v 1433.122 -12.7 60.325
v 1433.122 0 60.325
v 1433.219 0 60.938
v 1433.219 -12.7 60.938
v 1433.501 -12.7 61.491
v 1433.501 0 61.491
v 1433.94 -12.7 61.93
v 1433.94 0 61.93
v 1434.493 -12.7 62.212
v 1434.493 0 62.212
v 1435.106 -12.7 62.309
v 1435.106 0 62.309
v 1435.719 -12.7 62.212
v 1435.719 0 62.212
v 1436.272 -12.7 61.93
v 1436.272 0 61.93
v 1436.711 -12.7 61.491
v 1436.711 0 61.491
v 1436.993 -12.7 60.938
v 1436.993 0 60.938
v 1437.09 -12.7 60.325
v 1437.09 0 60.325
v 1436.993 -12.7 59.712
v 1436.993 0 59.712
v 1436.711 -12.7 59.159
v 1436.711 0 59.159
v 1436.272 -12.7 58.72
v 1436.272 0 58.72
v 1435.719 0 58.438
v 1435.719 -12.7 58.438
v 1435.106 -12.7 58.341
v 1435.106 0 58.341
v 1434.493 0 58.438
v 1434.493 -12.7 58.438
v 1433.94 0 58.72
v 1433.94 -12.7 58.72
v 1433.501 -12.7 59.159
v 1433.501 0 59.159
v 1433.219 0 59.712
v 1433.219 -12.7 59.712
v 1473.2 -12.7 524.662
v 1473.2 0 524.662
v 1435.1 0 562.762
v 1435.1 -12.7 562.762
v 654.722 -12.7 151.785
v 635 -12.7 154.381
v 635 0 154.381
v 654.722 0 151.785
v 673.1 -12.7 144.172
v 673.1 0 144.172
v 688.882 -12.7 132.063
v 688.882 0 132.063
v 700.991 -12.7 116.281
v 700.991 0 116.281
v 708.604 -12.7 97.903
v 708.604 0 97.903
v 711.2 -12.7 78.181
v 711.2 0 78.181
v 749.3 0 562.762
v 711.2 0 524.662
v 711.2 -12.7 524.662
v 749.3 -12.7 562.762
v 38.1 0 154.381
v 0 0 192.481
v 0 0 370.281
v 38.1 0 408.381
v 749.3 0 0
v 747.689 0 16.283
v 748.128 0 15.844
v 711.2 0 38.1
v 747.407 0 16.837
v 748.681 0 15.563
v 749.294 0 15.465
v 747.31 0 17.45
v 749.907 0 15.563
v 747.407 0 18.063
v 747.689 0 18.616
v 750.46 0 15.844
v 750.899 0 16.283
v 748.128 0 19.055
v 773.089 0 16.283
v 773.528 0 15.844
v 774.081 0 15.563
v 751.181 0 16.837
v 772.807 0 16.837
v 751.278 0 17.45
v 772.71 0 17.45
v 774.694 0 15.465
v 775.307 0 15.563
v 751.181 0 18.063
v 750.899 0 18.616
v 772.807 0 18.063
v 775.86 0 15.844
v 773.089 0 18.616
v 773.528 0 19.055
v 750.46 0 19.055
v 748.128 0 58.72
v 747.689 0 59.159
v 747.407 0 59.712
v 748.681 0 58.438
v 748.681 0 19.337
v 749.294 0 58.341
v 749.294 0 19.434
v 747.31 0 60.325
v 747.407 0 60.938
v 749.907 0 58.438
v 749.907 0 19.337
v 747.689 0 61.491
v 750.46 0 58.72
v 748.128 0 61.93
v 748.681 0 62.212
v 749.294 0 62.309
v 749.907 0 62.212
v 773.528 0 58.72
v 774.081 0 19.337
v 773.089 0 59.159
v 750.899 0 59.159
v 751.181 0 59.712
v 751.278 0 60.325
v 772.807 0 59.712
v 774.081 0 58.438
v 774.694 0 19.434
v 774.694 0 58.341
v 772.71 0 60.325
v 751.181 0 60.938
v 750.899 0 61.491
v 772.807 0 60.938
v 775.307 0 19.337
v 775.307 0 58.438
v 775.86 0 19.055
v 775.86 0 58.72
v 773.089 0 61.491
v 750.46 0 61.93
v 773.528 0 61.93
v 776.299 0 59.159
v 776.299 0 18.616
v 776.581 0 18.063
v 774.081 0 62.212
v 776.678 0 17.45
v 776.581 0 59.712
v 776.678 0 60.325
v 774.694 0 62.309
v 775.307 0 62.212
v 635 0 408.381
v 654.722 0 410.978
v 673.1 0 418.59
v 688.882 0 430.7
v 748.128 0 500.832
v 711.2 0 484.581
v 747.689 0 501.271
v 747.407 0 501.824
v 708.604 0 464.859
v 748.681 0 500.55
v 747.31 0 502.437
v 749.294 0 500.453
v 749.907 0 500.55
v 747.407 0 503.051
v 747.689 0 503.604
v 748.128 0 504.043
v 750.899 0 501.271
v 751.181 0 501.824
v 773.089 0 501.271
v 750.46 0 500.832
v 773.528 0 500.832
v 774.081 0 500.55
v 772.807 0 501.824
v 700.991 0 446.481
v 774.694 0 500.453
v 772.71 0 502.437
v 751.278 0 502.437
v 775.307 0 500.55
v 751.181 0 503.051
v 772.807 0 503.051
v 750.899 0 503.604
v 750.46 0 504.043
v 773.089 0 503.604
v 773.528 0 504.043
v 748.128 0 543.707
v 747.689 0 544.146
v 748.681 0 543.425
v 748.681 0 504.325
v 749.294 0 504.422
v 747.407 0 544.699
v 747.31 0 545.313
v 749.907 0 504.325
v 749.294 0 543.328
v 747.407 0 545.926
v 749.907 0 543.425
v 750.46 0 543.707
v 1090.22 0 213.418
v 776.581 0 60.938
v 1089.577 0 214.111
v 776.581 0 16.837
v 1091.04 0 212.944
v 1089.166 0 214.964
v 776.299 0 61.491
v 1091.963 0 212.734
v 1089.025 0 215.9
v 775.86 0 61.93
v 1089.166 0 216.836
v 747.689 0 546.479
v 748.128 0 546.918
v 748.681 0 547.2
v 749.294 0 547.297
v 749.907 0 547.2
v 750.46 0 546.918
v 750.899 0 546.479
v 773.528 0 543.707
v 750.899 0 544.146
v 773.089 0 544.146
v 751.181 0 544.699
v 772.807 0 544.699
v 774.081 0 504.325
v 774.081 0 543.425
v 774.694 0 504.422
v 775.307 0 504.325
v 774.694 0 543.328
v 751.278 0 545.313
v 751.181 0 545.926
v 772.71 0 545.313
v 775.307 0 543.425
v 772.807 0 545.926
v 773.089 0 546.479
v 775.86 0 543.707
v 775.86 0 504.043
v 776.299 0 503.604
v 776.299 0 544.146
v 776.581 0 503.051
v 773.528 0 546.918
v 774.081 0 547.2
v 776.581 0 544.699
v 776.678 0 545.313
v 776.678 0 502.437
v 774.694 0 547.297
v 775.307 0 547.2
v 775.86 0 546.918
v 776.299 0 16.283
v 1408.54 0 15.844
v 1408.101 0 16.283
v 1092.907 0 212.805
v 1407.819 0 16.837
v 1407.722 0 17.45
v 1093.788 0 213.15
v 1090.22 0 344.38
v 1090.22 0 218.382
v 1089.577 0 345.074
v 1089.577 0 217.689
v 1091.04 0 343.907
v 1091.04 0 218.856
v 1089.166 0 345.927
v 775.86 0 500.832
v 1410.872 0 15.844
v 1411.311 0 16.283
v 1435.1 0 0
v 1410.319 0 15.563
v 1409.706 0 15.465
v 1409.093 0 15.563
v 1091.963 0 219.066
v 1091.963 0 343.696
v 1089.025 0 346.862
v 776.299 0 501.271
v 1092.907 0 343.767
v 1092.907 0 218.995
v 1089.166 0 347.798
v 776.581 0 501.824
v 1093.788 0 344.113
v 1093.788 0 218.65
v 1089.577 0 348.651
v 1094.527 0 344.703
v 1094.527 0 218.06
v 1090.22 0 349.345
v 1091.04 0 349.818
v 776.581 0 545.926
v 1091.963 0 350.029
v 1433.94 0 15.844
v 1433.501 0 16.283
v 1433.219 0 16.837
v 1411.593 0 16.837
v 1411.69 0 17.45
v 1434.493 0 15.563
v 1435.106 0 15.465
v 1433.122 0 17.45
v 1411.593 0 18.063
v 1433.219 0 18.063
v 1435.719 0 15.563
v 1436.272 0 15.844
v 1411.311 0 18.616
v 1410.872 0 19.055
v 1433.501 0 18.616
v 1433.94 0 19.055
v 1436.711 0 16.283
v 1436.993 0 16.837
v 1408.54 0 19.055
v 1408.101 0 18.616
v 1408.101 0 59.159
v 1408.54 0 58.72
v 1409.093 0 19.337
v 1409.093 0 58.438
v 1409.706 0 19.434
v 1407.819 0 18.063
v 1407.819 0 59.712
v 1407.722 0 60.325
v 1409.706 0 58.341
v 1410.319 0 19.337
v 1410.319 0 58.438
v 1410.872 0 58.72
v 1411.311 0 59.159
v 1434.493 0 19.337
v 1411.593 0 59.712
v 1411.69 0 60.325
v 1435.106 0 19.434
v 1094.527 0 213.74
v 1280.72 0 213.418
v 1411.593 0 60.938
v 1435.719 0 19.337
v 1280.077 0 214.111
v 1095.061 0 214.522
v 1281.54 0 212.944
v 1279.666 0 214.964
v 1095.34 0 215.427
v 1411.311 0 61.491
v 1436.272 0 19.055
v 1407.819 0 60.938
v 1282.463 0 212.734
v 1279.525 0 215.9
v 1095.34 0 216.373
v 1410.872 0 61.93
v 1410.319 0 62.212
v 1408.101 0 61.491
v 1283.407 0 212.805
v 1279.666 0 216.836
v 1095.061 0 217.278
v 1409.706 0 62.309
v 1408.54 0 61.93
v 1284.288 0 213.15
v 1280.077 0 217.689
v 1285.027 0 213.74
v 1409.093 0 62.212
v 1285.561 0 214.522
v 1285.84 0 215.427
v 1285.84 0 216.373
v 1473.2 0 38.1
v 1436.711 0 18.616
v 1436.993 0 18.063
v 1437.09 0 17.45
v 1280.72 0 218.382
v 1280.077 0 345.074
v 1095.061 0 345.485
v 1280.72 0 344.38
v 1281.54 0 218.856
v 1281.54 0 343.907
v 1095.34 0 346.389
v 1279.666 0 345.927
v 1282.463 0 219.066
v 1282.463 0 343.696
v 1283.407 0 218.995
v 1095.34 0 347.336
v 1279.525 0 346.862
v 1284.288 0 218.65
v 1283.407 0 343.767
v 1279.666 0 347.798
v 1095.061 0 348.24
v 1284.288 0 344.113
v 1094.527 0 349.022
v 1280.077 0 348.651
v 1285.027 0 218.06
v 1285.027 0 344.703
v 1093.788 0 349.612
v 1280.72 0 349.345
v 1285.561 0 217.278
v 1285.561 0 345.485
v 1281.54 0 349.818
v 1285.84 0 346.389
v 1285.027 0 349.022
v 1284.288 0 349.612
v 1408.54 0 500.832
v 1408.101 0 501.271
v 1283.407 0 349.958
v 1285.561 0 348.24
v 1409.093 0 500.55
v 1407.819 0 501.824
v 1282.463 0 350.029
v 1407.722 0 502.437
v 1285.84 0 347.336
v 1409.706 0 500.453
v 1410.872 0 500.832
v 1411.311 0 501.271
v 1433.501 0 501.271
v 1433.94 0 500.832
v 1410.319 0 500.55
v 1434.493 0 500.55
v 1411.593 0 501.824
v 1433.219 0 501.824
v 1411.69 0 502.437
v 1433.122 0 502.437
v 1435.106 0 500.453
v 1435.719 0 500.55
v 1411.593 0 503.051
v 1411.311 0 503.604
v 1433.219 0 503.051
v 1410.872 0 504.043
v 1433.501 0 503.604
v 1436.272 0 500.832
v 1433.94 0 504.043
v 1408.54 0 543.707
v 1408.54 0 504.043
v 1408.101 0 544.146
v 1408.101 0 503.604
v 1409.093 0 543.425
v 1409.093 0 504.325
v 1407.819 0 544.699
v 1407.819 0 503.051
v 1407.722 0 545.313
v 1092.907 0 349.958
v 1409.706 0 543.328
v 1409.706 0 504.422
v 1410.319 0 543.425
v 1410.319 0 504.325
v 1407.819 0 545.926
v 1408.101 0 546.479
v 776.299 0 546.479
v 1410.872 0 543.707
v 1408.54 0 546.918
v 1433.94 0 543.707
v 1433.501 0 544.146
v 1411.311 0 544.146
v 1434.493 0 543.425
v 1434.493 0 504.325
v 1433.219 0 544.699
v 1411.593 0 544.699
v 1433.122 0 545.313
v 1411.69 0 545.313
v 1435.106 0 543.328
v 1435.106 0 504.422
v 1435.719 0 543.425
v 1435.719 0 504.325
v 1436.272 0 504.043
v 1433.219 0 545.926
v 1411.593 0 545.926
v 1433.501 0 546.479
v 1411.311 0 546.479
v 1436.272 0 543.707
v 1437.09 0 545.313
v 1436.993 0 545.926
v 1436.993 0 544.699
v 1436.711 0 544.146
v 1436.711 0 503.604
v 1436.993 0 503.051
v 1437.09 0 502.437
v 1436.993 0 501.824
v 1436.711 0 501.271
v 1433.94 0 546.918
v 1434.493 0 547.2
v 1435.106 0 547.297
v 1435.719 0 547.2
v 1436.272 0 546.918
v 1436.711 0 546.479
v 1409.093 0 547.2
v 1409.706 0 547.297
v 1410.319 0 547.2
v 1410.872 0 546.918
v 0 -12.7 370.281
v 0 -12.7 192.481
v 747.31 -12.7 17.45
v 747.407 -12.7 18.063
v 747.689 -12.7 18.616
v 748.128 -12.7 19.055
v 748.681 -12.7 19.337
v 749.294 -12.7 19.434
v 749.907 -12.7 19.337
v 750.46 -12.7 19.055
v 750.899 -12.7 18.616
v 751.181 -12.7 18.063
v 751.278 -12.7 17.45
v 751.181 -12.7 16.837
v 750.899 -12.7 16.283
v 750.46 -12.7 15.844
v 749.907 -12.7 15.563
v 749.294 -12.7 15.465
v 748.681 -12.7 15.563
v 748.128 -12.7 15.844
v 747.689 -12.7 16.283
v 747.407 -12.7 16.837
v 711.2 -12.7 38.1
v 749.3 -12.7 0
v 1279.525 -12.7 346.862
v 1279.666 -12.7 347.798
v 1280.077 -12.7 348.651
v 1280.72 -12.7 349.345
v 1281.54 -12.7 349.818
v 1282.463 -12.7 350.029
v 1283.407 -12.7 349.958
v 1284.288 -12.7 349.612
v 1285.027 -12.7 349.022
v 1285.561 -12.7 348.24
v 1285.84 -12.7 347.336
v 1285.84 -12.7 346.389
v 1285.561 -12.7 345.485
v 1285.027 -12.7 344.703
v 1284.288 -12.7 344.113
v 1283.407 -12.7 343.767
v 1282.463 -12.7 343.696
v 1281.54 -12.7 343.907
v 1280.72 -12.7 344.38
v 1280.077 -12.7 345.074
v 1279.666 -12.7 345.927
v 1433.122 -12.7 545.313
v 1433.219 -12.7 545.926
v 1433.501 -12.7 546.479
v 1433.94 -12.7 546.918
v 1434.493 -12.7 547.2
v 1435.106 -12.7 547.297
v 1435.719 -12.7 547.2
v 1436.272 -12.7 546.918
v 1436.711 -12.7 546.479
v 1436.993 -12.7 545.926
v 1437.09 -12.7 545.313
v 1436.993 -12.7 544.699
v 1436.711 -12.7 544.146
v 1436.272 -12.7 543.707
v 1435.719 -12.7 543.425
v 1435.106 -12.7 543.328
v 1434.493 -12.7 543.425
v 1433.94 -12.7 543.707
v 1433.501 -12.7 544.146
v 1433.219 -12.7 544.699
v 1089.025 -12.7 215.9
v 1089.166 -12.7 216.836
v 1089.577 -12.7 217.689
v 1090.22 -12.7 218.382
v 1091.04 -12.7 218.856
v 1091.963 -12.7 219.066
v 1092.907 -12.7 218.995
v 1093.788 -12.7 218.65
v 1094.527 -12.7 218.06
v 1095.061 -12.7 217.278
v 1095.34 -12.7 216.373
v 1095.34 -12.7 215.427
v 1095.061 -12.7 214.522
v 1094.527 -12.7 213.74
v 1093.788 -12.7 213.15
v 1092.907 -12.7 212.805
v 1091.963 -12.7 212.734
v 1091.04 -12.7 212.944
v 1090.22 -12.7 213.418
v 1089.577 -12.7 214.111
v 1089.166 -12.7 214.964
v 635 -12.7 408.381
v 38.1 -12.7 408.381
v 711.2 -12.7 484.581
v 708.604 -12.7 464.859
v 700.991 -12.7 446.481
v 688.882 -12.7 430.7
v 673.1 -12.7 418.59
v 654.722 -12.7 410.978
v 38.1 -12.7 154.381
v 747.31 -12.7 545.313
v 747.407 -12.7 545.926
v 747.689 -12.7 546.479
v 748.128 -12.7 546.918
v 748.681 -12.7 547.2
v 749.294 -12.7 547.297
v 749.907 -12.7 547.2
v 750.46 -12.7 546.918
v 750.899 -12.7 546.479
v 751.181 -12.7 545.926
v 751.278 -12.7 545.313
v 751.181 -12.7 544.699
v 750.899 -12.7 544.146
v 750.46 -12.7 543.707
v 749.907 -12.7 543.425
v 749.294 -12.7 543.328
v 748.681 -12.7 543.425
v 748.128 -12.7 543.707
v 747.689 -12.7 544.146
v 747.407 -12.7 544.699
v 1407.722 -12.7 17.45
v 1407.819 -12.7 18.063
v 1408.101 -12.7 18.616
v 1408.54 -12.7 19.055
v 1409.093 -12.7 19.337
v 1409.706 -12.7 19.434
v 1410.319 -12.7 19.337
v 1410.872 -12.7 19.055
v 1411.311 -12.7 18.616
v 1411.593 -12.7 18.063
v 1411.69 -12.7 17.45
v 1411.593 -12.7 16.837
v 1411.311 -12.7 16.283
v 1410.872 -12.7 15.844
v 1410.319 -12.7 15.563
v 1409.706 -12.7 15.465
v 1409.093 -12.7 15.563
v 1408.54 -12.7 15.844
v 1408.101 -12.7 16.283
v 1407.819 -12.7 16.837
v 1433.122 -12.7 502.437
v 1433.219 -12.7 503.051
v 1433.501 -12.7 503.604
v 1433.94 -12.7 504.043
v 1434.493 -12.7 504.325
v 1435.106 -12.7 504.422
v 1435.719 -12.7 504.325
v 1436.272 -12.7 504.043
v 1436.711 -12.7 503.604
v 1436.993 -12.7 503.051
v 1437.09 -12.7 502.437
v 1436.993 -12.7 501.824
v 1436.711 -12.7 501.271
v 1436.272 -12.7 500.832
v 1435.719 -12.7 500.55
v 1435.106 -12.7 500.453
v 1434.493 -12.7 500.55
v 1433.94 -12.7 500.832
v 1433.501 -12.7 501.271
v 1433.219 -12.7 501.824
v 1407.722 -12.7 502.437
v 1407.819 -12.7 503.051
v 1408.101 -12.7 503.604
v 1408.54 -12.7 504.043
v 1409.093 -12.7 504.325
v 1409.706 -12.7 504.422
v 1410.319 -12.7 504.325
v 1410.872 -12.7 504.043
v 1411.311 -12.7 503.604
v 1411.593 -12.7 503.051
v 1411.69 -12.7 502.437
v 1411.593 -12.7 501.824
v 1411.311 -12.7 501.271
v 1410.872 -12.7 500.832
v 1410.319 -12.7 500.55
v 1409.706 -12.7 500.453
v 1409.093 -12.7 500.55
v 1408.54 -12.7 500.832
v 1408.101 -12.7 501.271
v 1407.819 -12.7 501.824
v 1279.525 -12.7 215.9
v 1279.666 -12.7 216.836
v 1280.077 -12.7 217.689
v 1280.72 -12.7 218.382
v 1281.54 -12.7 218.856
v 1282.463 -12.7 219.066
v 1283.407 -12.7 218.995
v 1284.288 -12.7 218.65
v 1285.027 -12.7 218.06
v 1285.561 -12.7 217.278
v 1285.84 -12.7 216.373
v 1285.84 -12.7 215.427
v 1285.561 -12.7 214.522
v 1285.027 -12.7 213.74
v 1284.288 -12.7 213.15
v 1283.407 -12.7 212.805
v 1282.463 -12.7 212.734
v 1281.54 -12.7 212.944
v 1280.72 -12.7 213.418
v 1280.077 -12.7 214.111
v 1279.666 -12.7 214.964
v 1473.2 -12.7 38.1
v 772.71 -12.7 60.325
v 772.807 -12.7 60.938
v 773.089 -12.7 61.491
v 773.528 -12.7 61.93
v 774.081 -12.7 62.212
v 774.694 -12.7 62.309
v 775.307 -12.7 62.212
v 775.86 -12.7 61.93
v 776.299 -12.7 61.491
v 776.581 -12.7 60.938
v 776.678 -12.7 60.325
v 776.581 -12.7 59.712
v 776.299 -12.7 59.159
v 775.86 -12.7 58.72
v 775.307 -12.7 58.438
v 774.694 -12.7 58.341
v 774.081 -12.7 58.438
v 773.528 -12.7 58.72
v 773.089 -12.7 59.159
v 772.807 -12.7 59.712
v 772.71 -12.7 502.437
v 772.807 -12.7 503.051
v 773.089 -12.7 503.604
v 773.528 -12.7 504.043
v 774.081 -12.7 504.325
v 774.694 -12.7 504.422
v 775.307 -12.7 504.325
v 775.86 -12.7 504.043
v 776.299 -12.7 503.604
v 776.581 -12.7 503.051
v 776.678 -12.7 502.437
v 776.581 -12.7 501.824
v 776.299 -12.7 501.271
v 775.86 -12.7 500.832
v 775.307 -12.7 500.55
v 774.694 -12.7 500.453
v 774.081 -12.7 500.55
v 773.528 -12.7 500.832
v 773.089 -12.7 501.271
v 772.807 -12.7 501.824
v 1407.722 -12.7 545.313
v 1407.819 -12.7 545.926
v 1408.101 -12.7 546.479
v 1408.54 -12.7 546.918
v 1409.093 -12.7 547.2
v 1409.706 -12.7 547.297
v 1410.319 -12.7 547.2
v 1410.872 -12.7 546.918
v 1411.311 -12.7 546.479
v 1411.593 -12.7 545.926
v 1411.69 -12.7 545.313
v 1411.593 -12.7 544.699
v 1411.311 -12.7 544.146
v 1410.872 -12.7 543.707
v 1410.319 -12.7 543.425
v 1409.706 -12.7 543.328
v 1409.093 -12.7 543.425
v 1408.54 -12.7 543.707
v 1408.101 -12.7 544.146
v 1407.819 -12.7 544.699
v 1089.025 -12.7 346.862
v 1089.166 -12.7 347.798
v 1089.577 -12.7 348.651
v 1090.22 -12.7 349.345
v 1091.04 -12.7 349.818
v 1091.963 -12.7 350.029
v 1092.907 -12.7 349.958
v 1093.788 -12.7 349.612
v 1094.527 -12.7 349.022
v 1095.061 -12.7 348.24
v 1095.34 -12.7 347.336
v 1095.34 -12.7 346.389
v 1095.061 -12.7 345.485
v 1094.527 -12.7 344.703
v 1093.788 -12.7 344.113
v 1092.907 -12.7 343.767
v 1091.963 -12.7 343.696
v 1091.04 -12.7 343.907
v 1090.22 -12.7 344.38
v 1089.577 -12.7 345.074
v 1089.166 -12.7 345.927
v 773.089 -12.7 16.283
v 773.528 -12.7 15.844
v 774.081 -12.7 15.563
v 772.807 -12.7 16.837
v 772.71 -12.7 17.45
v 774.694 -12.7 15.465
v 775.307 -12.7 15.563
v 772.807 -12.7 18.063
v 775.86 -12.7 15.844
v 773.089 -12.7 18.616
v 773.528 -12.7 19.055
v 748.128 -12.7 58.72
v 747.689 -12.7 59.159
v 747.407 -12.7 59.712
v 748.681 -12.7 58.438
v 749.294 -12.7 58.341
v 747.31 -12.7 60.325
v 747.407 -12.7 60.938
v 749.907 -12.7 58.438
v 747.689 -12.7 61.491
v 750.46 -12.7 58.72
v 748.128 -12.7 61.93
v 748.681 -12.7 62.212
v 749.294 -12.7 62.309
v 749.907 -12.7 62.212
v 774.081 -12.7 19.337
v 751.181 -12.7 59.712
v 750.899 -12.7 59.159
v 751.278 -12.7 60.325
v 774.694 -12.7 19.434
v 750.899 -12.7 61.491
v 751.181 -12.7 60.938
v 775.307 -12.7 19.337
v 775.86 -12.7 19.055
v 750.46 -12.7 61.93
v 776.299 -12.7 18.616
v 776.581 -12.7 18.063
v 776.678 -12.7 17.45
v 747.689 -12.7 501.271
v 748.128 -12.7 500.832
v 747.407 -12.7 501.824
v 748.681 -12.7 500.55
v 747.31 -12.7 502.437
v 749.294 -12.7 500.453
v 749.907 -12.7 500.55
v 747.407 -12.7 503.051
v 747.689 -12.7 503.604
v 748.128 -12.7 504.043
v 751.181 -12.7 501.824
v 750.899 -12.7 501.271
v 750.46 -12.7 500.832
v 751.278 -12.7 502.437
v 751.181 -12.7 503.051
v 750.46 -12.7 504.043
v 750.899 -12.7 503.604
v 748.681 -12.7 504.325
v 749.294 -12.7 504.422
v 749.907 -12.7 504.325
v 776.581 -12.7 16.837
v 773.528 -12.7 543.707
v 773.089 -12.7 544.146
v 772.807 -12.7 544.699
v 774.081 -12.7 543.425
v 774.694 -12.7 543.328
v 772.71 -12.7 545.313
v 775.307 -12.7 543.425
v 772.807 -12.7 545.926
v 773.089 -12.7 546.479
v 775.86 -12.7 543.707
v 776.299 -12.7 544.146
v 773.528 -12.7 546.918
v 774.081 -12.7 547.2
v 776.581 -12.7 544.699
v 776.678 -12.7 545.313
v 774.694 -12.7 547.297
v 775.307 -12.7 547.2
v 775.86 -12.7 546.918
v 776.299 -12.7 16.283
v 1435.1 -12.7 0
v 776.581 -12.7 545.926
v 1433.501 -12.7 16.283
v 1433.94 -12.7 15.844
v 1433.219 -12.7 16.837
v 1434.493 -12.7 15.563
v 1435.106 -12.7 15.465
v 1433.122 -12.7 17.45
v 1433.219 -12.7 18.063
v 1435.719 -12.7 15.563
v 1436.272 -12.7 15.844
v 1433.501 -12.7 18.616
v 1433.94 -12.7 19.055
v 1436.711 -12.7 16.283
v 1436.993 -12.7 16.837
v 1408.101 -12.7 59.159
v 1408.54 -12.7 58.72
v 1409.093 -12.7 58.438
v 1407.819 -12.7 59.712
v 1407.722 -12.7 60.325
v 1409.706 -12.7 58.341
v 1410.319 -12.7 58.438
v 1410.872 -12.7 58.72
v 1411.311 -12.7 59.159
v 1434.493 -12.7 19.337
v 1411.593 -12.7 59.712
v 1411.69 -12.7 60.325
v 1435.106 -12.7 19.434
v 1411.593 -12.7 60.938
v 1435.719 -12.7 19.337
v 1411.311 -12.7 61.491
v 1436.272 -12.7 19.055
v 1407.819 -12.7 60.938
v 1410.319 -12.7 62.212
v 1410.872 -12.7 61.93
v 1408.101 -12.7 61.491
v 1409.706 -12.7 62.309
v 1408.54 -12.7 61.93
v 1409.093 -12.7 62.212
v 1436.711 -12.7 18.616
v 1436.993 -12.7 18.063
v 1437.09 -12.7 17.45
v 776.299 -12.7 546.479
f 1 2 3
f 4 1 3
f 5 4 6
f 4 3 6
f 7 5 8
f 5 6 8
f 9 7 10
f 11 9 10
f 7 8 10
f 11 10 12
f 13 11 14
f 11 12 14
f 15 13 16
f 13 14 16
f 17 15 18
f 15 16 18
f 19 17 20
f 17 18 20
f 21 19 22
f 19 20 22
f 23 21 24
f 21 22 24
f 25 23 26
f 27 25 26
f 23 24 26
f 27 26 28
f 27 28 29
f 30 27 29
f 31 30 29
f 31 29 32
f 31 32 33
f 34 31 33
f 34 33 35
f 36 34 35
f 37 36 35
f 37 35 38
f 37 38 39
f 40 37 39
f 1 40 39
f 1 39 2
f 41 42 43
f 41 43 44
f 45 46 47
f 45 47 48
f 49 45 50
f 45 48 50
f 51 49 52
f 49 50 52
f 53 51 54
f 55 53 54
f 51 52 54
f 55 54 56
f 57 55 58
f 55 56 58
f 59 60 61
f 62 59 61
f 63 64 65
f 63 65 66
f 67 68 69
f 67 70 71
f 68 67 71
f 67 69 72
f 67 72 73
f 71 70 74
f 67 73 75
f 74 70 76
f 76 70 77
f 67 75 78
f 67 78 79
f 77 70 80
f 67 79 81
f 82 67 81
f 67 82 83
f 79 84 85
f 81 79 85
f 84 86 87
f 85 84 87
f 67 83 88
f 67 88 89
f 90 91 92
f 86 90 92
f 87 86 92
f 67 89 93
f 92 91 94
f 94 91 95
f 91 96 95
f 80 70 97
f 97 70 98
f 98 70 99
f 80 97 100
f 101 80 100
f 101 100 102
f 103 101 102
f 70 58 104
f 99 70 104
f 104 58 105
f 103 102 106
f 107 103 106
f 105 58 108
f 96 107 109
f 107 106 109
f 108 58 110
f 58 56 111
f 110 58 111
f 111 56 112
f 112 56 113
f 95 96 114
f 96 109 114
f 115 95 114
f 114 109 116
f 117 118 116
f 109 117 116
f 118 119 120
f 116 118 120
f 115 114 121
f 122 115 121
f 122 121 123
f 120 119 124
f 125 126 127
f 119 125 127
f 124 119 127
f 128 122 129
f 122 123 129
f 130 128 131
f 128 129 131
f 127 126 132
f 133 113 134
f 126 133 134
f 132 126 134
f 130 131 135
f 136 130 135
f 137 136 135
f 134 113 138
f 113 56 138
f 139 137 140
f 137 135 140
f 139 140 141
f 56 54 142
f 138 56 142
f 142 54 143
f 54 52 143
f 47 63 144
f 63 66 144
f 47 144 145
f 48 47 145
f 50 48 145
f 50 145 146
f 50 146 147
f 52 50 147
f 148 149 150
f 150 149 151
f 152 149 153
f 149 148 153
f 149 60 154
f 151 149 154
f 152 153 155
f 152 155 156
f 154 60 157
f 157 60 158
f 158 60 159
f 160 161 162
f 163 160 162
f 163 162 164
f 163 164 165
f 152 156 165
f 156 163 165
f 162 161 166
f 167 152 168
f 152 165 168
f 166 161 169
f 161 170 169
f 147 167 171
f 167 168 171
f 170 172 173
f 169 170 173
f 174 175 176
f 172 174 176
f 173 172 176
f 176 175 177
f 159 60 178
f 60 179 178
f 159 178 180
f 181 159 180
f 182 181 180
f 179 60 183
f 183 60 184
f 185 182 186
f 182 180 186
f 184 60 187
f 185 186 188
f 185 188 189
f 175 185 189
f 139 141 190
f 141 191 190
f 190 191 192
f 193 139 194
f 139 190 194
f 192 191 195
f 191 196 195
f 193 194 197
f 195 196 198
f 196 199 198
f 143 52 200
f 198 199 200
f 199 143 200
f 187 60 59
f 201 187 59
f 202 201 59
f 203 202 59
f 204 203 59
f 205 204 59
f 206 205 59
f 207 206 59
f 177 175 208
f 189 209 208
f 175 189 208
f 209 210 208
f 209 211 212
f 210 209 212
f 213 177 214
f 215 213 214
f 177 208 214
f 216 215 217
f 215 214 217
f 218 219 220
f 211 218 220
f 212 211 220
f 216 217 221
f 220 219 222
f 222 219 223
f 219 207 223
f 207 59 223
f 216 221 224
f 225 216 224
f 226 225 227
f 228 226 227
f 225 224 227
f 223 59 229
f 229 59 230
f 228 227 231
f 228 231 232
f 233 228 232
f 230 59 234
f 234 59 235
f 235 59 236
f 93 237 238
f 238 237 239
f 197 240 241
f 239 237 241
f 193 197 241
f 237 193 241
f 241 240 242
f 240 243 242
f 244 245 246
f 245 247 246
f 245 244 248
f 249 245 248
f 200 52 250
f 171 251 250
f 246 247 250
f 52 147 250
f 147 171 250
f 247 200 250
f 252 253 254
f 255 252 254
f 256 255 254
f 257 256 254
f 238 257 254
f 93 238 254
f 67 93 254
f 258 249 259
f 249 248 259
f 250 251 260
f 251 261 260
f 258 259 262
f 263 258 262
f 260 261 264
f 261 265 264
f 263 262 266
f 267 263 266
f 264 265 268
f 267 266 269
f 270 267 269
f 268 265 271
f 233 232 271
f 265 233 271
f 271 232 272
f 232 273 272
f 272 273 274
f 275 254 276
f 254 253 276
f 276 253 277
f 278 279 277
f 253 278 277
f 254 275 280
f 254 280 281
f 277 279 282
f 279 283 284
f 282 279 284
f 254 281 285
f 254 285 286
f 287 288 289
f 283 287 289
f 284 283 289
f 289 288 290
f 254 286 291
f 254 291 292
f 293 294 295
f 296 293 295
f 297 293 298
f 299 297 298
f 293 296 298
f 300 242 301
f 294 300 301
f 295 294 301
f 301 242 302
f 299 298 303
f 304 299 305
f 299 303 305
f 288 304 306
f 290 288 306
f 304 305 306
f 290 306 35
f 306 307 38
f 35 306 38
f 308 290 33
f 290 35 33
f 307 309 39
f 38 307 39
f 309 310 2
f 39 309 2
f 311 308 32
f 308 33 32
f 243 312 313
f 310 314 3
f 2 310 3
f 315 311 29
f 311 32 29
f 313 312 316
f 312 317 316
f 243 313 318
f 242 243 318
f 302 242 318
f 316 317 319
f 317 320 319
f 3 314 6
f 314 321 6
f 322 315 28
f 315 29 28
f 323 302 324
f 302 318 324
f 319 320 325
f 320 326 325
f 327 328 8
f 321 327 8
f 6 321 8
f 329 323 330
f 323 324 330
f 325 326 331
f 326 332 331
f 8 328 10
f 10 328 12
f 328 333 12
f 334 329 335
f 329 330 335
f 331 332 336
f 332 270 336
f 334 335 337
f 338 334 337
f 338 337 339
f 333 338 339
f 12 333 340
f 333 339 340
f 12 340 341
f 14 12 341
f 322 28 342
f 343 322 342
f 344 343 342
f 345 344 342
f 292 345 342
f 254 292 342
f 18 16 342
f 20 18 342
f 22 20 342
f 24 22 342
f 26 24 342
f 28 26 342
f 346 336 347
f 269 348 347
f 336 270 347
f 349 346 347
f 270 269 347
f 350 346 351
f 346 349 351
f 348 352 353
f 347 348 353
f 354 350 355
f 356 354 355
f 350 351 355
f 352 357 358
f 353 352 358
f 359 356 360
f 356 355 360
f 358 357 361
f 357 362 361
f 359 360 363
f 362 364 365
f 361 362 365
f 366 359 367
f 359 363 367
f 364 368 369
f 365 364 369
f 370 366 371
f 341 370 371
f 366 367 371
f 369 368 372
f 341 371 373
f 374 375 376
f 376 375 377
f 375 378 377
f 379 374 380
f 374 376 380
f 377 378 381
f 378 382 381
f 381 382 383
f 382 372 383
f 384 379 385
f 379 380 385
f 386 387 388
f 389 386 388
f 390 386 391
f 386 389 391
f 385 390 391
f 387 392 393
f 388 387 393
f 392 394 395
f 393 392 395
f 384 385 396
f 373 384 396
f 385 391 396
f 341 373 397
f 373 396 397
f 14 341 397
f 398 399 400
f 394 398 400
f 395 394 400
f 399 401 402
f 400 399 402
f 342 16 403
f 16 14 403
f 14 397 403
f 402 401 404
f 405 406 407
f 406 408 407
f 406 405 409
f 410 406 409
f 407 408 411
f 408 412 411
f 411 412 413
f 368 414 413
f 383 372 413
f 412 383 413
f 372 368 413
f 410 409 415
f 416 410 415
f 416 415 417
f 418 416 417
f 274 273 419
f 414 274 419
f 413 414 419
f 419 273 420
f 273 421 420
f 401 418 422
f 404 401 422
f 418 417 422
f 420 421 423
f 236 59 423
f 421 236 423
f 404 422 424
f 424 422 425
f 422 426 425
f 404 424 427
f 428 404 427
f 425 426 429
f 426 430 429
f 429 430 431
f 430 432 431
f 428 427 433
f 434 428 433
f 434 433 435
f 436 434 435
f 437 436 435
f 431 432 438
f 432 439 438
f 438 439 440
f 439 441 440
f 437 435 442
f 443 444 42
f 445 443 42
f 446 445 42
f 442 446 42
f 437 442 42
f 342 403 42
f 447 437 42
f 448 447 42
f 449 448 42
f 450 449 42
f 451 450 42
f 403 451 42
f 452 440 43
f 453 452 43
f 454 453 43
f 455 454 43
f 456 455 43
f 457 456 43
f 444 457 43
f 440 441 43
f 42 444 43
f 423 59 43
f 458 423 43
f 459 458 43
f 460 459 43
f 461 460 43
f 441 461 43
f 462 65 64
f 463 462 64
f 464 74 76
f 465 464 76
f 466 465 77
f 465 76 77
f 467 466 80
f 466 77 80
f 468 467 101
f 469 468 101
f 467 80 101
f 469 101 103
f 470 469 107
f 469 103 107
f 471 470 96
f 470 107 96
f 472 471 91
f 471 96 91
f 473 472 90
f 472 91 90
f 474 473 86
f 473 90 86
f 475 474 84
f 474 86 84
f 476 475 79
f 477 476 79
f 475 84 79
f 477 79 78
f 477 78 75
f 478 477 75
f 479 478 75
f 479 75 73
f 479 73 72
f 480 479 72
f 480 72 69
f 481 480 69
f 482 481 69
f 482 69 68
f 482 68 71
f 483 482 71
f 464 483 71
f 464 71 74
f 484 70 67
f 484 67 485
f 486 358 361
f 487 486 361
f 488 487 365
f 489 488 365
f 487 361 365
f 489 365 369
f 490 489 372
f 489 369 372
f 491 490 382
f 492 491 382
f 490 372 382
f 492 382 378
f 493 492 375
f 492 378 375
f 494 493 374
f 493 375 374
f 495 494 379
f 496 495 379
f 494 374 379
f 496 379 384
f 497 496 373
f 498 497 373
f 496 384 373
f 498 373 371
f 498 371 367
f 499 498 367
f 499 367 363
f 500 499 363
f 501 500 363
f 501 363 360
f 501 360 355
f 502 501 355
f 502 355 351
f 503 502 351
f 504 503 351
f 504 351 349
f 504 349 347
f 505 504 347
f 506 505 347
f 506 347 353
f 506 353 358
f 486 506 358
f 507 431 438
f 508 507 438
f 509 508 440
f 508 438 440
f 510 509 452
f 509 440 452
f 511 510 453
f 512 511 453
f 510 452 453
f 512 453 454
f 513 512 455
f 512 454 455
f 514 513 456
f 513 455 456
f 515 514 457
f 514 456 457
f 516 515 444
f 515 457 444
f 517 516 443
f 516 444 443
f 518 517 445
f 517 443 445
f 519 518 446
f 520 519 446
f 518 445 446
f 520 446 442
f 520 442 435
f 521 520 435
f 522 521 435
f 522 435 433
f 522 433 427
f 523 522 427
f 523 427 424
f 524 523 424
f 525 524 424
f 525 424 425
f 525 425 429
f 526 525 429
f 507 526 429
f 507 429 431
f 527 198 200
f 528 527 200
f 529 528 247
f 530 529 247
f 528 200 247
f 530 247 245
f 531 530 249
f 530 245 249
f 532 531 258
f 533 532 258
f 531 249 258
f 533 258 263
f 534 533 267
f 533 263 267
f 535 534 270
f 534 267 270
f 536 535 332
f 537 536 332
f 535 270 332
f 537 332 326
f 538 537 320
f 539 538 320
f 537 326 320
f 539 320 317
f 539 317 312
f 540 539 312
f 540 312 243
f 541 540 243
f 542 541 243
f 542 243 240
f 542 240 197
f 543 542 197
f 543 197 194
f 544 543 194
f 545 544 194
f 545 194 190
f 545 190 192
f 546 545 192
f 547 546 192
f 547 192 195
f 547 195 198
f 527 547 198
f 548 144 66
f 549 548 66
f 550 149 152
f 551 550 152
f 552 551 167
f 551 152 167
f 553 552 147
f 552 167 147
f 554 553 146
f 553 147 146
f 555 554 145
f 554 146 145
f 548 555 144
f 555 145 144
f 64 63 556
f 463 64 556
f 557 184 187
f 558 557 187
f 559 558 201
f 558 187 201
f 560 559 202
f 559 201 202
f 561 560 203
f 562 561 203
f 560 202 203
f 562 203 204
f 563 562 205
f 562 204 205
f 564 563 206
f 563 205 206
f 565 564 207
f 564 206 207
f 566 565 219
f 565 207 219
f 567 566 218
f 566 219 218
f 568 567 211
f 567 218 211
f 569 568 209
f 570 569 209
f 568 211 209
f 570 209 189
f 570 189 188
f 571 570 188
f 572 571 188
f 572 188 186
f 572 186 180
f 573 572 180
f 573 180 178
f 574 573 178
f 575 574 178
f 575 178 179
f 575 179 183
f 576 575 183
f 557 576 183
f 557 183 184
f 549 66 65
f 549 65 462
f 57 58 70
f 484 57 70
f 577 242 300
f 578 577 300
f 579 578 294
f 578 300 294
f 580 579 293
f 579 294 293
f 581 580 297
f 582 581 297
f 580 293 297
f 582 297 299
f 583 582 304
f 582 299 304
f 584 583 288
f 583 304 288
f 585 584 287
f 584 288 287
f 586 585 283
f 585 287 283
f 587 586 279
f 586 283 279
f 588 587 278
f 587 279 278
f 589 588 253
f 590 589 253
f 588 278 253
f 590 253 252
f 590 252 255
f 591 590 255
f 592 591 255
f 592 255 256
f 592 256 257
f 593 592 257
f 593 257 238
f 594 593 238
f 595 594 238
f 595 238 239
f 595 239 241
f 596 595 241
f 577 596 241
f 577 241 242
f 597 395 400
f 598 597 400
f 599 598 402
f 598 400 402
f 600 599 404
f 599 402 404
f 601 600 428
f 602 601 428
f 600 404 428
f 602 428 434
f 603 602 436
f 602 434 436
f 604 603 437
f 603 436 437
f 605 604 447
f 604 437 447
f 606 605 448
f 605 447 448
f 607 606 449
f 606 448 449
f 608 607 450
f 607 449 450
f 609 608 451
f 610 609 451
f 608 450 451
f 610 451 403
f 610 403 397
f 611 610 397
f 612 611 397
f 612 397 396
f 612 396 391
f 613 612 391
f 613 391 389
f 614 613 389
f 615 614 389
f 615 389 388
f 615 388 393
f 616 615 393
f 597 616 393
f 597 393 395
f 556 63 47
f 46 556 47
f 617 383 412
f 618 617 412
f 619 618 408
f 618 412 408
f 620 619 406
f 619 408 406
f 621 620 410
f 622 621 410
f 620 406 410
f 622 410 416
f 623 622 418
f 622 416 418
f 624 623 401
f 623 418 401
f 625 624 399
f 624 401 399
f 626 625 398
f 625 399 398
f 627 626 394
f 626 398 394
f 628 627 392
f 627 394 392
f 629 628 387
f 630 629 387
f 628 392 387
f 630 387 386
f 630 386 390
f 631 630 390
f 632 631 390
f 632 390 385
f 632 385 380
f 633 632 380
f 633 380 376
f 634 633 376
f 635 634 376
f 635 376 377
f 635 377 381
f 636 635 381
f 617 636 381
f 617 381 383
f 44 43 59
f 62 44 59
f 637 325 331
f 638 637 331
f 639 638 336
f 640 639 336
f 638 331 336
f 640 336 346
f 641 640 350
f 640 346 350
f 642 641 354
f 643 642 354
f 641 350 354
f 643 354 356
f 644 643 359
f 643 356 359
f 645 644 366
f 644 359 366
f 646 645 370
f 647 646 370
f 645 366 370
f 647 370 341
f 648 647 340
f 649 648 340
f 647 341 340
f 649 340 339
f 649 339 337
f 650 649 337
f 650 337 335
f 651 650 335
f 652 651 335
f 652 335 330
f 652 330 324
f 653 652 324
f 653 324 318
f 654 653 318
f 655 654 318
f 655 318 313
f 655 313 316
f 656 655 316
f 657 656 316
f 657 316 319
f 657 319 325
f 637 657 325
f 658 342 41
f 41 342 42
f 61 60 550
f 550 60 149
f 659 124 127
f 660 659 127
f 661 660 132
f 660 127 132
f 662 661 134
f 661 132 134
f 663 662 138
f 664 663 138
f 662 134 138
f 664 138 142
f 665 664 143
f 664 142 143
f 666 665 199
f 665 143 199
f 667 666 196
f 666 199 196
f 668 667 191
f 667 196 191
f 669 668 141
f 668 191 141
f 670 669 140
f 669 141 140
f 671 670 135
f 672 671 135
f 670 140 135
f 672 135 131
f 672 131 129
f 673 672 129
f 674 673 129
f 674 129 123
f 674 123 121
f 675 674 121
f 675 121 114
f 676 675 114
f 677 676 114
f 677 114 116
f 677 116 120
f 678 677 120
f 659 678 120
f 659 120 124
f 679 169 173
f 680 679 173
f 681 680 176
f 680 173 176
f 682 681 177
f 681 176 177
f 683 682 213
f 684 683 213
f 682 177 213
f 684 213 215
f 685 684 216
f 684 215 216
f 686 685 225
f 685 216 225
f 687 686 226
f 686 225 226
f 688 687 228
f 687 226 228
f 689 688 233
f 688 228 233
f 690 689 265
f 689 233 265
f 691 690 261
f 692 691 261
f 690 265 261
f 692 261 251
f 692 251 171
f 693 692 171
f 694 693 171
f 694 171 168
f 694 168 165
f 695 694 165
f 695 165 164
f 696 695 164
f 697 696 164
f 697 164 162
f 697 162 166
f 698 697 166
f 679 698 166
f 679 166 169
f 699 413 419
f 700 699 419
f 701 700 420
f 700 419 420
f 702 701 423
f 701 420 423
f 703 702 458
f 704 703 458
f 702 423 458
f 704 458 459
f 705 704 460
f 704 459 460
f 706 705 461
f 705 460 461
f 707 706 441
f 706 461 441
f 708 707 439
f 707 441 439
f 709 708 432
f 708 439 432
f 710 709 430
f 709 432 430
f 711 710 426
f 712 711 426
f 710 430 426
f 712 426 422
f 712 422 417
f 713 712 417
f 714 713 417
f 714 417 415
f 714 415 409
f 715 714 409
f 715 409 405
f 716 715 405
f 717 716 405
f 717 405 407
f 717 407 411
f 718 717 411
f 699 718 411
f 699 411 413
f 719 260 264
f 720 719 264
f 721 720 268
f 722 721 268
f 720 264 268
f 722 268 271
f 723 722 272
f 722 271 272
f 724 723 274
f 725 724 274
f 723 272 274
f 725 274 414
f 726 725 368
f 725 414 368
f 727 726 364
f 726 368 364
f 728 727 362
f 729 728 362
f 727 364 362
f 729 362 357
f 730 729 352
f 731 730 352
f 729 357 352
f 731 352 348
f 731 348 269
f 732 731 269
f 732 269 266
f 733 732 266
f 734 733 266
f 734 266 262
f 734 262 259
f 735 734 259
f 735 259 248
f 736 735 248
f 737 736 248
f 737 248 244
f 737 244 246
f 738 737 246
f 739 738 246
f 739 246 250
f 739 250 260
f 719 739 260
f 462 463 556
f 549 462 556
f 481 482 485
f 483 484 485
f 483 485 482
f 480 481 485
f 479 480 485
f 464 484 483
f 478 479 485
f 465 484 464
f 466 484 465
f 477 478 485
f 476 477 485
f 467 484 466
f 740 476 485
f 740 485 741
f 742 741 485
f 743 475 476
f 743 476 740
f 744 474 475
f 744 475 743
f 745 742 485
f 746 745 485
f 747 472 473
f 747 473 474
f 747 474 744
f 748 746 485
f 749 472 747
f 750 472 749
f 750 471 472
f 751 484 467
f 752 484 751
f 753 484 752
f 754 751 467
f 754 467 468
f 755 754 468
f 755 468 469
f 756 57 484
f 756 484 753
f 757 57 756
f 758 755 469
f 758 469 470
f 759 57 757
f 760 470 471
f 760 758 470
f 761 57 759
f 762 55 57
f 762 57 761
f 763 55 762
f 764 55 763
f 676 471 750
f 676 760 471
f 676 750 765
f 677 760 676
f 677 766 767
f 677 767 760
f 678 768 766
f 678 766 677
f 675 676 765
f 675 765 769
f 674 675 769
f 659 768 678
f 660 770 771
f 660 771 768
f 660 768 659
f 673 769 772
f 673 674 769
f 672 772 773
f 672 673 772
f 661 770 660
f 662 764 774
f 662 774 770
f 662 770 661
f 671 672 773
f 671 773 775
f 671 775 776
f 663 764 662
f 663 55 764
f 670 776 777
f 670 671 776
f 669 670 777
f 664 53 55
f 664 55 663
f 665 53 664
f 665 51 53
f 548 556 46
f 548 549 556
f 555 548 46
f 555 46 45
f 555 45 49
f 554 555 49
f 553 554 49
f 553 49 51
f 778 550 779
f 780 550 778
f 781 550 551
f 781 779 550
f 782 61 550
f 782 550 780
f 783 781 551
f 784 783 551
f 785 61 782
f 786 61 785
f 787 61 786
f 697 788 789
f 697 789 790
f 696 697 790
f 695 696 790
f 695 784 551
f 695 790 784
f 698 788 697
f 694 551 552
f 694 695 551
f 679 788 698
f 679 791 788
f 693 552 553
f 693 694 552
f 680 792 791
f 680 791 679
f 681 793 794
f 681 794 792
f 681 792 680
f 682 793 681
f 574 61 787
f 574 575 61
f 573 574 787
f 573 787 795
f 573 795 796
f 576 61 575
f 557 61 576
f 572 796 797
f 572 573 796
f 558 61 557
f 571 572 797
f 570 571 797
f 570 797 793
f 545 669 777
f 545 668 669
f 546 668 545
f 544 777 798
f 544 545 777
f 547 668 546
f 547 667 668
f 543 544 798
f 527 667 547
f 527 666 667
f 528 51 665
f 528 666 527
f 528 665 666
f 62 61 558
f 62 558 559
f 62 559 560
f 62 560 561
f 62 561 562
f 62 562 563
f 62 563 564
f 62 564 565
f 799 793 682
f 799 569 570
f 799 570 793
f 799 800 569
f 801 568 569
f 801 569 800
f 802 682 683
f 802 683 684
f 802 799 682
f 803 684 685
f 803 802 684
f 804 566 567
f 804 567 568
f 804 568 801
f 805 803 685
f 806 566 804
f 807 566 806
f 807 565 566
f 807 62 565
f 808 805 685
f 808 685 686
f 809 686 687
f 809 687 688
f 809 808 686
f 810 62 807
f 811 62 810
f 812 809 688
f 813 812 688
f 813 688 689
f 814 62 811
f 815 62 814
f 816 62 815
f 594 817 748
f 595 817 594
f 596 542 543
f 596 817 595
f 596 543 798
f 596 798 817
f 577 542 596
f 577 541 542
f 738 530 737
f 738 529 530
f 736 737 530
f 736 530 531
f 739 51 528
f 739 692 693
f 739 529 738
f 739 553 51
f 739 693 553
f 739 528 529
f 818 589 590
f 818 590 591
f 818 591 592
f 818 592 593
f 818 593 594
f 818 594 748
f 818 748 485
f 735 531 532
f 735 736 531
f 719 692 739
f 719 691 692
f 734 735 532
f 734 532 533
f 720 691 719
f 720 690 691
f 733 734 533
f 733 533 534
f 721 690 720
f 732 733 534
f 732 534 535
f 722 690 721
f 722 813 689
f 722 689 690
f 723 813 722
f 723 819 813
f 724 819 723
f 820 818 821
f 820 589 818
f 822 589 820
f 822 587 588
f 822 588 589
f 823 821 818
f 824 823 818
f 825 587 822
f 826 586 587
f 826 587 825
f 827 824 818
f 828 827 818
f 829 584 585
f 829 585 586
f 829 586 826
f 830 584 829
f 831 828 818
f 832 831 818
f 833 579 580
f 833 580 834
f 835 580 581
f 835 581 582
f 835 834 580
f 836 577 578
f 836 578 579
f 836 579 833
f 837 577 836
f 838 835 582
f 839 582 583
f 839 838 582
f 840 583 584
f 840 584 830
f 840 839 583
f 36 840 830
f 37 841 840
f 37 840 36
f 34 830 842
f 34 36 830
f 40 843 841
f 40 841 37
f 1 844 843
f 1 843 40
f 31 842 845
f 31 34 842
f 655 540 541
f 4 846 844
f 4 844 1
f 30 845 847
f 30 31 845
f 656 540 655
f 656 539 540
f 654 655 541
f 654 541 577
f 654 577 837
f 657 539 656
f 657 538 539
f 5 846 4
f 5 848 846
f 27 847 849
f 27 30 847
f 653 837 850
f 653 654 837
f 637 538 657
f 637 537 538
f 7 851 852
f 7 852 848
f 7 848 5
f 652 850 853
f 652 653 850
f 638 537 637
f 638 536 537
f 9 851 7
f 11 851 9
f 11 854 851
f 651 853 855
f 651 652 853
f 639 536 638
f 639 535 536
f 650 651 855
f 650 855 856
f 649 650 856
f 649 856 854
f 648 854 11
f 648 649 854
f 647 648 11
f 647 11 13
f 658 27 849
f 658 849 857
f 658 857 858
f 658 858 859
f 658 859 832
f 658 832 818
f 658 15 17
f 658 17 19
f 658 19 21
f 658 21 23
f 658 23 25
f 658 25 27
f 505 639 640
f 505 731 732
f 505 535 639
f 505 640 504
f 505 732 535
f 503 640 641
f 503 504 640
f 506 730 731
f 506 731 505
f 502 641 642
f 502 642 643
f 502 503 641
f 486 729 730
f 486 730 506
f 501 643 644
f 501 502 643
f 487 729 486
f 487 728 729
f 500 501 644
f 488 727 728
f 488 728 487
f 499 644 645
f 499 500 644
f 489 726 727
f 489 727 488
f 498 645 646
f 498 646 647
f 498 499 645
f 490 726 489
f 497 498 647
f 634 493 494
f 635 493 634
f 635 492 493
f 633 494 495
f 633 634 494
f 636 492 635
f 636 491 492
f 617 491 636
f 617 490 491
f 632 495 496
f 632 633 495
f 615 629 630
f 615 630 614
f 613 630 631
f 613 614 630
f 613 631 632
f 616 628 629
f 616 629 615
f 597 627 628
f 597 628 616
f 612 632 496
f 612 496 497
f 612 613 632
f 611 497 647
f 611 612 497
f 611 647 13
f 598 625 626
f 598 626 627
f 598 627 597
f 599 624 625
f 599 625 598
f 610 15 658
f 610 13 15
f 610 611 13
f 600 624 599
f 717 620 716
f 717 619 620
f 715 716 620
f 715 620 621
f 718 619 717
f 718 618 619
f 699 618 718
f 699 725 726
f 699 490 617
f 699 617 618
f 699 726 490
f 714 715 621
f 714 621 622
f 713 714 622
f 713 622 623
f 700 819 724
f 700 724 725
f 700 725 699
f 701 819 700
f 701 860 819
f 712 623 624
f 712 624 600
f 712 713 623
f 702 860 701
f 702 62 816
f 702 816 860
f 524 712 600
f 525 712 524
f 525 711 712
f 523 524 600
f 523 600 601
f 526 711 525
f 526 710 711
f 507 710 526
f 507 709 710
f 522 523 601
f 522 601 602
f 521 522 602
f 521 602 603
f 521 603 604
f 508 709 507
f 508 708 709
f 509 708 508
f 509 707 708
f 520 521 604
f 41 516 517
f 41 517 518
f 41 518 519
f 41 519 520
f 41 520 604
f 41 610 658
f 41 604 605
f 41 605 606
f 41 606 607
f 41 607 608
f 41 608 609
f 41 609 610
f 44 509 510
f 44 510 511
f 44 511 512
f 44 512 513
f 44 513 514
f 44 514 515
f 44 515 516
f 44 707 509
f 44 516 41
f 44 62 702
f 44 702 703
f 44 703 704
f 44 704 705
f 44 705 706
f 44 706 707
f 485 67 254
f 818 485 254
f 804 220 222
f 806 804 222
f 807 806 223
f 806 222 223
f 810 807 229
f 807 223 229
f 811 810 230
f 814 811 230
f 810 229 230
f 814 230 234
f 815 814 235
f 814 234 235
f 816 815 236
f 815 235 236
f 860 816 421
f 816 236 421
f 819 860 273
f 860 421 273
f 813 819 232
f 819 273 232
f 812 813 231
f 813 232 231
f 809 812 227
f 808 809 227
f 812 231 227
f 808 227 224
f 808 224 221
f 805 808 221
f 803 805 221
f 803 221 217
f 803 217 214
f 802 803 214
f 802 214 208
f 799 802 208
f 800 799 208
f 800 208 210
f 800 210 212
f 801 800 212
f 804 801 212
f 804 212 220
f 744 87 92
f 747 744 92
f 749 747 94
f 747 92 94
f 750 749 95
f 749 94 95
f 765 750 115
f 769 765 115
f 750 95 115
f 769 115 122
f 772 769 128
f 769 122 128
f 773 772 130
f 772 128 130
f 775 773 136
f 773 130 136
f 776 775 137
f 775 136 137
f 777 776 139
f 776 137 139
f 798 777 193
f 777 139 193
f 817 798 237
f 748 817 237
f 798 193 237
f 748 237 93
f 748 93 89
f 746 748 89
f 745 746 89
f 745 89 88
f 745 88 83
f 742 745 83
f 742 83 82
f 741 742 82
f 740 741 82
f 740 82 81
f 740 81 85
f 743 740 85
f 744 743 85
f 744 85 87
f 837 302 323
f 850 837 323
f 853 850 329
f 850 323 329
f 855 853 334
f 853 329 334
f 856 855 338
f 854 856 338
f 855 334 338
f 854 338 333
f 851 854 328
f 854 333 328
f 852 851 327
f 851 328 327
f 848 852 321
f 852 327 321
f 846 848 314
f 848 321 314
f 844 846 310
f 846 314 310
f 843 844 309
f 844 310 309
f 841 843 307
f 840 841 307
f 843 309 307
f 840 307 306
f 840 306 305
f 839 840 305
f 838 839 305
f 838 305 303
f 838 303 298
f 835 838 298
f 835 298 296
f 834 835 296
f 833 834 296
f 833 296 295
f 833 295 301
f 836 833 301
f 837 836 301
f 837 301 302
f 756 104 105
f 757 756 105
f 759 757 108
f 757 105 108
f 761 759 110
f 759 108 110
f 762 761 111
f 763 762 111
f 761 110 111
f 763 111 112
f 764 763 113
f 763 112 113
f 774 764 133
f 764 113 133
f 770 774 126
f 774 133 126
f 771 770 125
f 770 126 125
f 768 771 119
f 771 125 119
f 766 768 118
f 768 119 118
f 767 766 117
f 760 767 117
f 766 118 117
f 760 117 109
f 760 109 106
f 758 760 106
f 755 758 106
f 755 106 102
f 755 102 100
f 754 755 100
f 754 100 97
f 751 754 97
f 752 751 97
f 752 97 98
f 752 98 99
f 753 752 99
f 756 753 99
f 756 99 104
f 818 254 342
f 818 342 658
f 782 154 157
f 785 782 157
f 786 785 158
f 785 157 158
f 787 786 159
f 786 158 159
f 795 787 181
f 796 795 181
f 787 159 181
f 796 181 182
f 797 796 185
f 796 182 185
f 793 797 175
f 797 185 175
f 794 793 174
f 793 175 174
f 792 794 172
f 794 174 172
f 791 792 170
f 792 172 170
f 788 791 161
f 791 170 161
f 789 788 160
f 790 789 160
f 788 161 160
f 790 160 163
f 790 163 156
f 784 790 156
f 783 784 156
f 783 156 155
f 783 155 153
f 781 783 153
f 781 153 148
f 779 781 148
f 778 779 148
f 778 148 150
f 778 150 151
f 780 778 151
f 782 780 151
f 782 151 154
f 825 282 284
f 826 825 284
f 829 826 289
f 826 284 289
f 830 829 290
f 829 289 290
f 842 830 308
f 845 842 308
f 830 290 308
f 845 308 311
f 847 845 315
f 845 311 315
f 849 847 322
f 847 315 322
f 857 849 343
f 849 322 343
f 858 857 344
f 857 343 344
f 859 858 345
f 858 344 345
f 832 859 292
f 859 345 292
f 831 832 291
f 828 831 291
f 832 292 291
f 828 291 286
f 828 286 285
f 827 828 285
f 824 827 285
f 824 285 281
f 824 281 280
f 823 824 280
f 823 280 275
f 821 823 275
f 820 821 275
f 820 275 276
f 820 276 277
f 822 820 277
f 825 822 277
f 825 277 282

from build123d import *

# Parameters (mm, degrees)
F1_DEPTH = 12.7
F2_SIZE2 = 38.1
F2_SIZE  = 38.1
F4_D     = 6.35
F6_D     = 3.96875


with BuildPart() as f1:
    # F0 (on Front) → F1 (new body)
    with BuildSketch(Plane.XZ):
        with BuildLine():
            Line((711.2, 78.1812), (711.2, 0))
            Line((711.2, 0), (1473.2, 0))
            Line((1473.2, 0), (1473.2, 562.7624))
            Line((1473.2, 562.7624), (711.2, 562.7624))
            Line((711.2, 562.7624), (711.2, 484.5812))
            ThreePointArc((711.2, 484.5812), (688.881537, 430.699663), (635, 408.3812))
            Line((635, 408.3812), (0, 408.3812))
            Line((0, 408.3812), (0, 154.3812))
            Line((0, 154.3812), (635, 154.3812))
            ThreePointArc((635, 154.3812), (688.881537, 132.062737), (711.2, 78.1812))
        make_face()
    extrude(amount=F1_DEPTH)

    # F2
    f2_edges = [f1.edges().sort_by_distance(p)[0] for p in [
        (711.2, -6.35, 562.7624),
        (711.2, -6.35, 0),
        (1473.2, -6.35, 0),
        (1473.2, -6.35, 562.7624),
        (0, -6.35, 154.3812),
        (0, -6.35, 408.3812),
    ]]
    chamfer(f2_edges, length=F2_SIZE, length2=F2_SIZE2)

    # F4 (through all)
    with Locations(Plane.XZ.offset(12.7)):
        with Locations((1092.2, 215.9), (1092.2, 346.8624), (1282.7, 346.8624), (1282.7, 215.9)):
            Hole(F4_D / 2)

    # F6 (through all)
    with Locations(Plane.XZ.offset(12.7)):
        with Locations((749.293897, 545.3126), (749.293897, 502.4374), (774.693897, 502.4374), (774.693897, 545.3126), (749.293897, 60.325), (774.693897, 17.4498), (749.293897, 17.4498), (774.693897, 60.325), (1409.706103, 502.4374), (1435.106103, 502.4374), (1435.106103, 545.3126), (1409.706103, 545.3126), (1409.706103, 17.4498), (1435.106103, 17.4498), (1435.106103, 60.325), (1409.706103, 60.325)):
            Hole(F6_D / 2)


solid = f1.part
